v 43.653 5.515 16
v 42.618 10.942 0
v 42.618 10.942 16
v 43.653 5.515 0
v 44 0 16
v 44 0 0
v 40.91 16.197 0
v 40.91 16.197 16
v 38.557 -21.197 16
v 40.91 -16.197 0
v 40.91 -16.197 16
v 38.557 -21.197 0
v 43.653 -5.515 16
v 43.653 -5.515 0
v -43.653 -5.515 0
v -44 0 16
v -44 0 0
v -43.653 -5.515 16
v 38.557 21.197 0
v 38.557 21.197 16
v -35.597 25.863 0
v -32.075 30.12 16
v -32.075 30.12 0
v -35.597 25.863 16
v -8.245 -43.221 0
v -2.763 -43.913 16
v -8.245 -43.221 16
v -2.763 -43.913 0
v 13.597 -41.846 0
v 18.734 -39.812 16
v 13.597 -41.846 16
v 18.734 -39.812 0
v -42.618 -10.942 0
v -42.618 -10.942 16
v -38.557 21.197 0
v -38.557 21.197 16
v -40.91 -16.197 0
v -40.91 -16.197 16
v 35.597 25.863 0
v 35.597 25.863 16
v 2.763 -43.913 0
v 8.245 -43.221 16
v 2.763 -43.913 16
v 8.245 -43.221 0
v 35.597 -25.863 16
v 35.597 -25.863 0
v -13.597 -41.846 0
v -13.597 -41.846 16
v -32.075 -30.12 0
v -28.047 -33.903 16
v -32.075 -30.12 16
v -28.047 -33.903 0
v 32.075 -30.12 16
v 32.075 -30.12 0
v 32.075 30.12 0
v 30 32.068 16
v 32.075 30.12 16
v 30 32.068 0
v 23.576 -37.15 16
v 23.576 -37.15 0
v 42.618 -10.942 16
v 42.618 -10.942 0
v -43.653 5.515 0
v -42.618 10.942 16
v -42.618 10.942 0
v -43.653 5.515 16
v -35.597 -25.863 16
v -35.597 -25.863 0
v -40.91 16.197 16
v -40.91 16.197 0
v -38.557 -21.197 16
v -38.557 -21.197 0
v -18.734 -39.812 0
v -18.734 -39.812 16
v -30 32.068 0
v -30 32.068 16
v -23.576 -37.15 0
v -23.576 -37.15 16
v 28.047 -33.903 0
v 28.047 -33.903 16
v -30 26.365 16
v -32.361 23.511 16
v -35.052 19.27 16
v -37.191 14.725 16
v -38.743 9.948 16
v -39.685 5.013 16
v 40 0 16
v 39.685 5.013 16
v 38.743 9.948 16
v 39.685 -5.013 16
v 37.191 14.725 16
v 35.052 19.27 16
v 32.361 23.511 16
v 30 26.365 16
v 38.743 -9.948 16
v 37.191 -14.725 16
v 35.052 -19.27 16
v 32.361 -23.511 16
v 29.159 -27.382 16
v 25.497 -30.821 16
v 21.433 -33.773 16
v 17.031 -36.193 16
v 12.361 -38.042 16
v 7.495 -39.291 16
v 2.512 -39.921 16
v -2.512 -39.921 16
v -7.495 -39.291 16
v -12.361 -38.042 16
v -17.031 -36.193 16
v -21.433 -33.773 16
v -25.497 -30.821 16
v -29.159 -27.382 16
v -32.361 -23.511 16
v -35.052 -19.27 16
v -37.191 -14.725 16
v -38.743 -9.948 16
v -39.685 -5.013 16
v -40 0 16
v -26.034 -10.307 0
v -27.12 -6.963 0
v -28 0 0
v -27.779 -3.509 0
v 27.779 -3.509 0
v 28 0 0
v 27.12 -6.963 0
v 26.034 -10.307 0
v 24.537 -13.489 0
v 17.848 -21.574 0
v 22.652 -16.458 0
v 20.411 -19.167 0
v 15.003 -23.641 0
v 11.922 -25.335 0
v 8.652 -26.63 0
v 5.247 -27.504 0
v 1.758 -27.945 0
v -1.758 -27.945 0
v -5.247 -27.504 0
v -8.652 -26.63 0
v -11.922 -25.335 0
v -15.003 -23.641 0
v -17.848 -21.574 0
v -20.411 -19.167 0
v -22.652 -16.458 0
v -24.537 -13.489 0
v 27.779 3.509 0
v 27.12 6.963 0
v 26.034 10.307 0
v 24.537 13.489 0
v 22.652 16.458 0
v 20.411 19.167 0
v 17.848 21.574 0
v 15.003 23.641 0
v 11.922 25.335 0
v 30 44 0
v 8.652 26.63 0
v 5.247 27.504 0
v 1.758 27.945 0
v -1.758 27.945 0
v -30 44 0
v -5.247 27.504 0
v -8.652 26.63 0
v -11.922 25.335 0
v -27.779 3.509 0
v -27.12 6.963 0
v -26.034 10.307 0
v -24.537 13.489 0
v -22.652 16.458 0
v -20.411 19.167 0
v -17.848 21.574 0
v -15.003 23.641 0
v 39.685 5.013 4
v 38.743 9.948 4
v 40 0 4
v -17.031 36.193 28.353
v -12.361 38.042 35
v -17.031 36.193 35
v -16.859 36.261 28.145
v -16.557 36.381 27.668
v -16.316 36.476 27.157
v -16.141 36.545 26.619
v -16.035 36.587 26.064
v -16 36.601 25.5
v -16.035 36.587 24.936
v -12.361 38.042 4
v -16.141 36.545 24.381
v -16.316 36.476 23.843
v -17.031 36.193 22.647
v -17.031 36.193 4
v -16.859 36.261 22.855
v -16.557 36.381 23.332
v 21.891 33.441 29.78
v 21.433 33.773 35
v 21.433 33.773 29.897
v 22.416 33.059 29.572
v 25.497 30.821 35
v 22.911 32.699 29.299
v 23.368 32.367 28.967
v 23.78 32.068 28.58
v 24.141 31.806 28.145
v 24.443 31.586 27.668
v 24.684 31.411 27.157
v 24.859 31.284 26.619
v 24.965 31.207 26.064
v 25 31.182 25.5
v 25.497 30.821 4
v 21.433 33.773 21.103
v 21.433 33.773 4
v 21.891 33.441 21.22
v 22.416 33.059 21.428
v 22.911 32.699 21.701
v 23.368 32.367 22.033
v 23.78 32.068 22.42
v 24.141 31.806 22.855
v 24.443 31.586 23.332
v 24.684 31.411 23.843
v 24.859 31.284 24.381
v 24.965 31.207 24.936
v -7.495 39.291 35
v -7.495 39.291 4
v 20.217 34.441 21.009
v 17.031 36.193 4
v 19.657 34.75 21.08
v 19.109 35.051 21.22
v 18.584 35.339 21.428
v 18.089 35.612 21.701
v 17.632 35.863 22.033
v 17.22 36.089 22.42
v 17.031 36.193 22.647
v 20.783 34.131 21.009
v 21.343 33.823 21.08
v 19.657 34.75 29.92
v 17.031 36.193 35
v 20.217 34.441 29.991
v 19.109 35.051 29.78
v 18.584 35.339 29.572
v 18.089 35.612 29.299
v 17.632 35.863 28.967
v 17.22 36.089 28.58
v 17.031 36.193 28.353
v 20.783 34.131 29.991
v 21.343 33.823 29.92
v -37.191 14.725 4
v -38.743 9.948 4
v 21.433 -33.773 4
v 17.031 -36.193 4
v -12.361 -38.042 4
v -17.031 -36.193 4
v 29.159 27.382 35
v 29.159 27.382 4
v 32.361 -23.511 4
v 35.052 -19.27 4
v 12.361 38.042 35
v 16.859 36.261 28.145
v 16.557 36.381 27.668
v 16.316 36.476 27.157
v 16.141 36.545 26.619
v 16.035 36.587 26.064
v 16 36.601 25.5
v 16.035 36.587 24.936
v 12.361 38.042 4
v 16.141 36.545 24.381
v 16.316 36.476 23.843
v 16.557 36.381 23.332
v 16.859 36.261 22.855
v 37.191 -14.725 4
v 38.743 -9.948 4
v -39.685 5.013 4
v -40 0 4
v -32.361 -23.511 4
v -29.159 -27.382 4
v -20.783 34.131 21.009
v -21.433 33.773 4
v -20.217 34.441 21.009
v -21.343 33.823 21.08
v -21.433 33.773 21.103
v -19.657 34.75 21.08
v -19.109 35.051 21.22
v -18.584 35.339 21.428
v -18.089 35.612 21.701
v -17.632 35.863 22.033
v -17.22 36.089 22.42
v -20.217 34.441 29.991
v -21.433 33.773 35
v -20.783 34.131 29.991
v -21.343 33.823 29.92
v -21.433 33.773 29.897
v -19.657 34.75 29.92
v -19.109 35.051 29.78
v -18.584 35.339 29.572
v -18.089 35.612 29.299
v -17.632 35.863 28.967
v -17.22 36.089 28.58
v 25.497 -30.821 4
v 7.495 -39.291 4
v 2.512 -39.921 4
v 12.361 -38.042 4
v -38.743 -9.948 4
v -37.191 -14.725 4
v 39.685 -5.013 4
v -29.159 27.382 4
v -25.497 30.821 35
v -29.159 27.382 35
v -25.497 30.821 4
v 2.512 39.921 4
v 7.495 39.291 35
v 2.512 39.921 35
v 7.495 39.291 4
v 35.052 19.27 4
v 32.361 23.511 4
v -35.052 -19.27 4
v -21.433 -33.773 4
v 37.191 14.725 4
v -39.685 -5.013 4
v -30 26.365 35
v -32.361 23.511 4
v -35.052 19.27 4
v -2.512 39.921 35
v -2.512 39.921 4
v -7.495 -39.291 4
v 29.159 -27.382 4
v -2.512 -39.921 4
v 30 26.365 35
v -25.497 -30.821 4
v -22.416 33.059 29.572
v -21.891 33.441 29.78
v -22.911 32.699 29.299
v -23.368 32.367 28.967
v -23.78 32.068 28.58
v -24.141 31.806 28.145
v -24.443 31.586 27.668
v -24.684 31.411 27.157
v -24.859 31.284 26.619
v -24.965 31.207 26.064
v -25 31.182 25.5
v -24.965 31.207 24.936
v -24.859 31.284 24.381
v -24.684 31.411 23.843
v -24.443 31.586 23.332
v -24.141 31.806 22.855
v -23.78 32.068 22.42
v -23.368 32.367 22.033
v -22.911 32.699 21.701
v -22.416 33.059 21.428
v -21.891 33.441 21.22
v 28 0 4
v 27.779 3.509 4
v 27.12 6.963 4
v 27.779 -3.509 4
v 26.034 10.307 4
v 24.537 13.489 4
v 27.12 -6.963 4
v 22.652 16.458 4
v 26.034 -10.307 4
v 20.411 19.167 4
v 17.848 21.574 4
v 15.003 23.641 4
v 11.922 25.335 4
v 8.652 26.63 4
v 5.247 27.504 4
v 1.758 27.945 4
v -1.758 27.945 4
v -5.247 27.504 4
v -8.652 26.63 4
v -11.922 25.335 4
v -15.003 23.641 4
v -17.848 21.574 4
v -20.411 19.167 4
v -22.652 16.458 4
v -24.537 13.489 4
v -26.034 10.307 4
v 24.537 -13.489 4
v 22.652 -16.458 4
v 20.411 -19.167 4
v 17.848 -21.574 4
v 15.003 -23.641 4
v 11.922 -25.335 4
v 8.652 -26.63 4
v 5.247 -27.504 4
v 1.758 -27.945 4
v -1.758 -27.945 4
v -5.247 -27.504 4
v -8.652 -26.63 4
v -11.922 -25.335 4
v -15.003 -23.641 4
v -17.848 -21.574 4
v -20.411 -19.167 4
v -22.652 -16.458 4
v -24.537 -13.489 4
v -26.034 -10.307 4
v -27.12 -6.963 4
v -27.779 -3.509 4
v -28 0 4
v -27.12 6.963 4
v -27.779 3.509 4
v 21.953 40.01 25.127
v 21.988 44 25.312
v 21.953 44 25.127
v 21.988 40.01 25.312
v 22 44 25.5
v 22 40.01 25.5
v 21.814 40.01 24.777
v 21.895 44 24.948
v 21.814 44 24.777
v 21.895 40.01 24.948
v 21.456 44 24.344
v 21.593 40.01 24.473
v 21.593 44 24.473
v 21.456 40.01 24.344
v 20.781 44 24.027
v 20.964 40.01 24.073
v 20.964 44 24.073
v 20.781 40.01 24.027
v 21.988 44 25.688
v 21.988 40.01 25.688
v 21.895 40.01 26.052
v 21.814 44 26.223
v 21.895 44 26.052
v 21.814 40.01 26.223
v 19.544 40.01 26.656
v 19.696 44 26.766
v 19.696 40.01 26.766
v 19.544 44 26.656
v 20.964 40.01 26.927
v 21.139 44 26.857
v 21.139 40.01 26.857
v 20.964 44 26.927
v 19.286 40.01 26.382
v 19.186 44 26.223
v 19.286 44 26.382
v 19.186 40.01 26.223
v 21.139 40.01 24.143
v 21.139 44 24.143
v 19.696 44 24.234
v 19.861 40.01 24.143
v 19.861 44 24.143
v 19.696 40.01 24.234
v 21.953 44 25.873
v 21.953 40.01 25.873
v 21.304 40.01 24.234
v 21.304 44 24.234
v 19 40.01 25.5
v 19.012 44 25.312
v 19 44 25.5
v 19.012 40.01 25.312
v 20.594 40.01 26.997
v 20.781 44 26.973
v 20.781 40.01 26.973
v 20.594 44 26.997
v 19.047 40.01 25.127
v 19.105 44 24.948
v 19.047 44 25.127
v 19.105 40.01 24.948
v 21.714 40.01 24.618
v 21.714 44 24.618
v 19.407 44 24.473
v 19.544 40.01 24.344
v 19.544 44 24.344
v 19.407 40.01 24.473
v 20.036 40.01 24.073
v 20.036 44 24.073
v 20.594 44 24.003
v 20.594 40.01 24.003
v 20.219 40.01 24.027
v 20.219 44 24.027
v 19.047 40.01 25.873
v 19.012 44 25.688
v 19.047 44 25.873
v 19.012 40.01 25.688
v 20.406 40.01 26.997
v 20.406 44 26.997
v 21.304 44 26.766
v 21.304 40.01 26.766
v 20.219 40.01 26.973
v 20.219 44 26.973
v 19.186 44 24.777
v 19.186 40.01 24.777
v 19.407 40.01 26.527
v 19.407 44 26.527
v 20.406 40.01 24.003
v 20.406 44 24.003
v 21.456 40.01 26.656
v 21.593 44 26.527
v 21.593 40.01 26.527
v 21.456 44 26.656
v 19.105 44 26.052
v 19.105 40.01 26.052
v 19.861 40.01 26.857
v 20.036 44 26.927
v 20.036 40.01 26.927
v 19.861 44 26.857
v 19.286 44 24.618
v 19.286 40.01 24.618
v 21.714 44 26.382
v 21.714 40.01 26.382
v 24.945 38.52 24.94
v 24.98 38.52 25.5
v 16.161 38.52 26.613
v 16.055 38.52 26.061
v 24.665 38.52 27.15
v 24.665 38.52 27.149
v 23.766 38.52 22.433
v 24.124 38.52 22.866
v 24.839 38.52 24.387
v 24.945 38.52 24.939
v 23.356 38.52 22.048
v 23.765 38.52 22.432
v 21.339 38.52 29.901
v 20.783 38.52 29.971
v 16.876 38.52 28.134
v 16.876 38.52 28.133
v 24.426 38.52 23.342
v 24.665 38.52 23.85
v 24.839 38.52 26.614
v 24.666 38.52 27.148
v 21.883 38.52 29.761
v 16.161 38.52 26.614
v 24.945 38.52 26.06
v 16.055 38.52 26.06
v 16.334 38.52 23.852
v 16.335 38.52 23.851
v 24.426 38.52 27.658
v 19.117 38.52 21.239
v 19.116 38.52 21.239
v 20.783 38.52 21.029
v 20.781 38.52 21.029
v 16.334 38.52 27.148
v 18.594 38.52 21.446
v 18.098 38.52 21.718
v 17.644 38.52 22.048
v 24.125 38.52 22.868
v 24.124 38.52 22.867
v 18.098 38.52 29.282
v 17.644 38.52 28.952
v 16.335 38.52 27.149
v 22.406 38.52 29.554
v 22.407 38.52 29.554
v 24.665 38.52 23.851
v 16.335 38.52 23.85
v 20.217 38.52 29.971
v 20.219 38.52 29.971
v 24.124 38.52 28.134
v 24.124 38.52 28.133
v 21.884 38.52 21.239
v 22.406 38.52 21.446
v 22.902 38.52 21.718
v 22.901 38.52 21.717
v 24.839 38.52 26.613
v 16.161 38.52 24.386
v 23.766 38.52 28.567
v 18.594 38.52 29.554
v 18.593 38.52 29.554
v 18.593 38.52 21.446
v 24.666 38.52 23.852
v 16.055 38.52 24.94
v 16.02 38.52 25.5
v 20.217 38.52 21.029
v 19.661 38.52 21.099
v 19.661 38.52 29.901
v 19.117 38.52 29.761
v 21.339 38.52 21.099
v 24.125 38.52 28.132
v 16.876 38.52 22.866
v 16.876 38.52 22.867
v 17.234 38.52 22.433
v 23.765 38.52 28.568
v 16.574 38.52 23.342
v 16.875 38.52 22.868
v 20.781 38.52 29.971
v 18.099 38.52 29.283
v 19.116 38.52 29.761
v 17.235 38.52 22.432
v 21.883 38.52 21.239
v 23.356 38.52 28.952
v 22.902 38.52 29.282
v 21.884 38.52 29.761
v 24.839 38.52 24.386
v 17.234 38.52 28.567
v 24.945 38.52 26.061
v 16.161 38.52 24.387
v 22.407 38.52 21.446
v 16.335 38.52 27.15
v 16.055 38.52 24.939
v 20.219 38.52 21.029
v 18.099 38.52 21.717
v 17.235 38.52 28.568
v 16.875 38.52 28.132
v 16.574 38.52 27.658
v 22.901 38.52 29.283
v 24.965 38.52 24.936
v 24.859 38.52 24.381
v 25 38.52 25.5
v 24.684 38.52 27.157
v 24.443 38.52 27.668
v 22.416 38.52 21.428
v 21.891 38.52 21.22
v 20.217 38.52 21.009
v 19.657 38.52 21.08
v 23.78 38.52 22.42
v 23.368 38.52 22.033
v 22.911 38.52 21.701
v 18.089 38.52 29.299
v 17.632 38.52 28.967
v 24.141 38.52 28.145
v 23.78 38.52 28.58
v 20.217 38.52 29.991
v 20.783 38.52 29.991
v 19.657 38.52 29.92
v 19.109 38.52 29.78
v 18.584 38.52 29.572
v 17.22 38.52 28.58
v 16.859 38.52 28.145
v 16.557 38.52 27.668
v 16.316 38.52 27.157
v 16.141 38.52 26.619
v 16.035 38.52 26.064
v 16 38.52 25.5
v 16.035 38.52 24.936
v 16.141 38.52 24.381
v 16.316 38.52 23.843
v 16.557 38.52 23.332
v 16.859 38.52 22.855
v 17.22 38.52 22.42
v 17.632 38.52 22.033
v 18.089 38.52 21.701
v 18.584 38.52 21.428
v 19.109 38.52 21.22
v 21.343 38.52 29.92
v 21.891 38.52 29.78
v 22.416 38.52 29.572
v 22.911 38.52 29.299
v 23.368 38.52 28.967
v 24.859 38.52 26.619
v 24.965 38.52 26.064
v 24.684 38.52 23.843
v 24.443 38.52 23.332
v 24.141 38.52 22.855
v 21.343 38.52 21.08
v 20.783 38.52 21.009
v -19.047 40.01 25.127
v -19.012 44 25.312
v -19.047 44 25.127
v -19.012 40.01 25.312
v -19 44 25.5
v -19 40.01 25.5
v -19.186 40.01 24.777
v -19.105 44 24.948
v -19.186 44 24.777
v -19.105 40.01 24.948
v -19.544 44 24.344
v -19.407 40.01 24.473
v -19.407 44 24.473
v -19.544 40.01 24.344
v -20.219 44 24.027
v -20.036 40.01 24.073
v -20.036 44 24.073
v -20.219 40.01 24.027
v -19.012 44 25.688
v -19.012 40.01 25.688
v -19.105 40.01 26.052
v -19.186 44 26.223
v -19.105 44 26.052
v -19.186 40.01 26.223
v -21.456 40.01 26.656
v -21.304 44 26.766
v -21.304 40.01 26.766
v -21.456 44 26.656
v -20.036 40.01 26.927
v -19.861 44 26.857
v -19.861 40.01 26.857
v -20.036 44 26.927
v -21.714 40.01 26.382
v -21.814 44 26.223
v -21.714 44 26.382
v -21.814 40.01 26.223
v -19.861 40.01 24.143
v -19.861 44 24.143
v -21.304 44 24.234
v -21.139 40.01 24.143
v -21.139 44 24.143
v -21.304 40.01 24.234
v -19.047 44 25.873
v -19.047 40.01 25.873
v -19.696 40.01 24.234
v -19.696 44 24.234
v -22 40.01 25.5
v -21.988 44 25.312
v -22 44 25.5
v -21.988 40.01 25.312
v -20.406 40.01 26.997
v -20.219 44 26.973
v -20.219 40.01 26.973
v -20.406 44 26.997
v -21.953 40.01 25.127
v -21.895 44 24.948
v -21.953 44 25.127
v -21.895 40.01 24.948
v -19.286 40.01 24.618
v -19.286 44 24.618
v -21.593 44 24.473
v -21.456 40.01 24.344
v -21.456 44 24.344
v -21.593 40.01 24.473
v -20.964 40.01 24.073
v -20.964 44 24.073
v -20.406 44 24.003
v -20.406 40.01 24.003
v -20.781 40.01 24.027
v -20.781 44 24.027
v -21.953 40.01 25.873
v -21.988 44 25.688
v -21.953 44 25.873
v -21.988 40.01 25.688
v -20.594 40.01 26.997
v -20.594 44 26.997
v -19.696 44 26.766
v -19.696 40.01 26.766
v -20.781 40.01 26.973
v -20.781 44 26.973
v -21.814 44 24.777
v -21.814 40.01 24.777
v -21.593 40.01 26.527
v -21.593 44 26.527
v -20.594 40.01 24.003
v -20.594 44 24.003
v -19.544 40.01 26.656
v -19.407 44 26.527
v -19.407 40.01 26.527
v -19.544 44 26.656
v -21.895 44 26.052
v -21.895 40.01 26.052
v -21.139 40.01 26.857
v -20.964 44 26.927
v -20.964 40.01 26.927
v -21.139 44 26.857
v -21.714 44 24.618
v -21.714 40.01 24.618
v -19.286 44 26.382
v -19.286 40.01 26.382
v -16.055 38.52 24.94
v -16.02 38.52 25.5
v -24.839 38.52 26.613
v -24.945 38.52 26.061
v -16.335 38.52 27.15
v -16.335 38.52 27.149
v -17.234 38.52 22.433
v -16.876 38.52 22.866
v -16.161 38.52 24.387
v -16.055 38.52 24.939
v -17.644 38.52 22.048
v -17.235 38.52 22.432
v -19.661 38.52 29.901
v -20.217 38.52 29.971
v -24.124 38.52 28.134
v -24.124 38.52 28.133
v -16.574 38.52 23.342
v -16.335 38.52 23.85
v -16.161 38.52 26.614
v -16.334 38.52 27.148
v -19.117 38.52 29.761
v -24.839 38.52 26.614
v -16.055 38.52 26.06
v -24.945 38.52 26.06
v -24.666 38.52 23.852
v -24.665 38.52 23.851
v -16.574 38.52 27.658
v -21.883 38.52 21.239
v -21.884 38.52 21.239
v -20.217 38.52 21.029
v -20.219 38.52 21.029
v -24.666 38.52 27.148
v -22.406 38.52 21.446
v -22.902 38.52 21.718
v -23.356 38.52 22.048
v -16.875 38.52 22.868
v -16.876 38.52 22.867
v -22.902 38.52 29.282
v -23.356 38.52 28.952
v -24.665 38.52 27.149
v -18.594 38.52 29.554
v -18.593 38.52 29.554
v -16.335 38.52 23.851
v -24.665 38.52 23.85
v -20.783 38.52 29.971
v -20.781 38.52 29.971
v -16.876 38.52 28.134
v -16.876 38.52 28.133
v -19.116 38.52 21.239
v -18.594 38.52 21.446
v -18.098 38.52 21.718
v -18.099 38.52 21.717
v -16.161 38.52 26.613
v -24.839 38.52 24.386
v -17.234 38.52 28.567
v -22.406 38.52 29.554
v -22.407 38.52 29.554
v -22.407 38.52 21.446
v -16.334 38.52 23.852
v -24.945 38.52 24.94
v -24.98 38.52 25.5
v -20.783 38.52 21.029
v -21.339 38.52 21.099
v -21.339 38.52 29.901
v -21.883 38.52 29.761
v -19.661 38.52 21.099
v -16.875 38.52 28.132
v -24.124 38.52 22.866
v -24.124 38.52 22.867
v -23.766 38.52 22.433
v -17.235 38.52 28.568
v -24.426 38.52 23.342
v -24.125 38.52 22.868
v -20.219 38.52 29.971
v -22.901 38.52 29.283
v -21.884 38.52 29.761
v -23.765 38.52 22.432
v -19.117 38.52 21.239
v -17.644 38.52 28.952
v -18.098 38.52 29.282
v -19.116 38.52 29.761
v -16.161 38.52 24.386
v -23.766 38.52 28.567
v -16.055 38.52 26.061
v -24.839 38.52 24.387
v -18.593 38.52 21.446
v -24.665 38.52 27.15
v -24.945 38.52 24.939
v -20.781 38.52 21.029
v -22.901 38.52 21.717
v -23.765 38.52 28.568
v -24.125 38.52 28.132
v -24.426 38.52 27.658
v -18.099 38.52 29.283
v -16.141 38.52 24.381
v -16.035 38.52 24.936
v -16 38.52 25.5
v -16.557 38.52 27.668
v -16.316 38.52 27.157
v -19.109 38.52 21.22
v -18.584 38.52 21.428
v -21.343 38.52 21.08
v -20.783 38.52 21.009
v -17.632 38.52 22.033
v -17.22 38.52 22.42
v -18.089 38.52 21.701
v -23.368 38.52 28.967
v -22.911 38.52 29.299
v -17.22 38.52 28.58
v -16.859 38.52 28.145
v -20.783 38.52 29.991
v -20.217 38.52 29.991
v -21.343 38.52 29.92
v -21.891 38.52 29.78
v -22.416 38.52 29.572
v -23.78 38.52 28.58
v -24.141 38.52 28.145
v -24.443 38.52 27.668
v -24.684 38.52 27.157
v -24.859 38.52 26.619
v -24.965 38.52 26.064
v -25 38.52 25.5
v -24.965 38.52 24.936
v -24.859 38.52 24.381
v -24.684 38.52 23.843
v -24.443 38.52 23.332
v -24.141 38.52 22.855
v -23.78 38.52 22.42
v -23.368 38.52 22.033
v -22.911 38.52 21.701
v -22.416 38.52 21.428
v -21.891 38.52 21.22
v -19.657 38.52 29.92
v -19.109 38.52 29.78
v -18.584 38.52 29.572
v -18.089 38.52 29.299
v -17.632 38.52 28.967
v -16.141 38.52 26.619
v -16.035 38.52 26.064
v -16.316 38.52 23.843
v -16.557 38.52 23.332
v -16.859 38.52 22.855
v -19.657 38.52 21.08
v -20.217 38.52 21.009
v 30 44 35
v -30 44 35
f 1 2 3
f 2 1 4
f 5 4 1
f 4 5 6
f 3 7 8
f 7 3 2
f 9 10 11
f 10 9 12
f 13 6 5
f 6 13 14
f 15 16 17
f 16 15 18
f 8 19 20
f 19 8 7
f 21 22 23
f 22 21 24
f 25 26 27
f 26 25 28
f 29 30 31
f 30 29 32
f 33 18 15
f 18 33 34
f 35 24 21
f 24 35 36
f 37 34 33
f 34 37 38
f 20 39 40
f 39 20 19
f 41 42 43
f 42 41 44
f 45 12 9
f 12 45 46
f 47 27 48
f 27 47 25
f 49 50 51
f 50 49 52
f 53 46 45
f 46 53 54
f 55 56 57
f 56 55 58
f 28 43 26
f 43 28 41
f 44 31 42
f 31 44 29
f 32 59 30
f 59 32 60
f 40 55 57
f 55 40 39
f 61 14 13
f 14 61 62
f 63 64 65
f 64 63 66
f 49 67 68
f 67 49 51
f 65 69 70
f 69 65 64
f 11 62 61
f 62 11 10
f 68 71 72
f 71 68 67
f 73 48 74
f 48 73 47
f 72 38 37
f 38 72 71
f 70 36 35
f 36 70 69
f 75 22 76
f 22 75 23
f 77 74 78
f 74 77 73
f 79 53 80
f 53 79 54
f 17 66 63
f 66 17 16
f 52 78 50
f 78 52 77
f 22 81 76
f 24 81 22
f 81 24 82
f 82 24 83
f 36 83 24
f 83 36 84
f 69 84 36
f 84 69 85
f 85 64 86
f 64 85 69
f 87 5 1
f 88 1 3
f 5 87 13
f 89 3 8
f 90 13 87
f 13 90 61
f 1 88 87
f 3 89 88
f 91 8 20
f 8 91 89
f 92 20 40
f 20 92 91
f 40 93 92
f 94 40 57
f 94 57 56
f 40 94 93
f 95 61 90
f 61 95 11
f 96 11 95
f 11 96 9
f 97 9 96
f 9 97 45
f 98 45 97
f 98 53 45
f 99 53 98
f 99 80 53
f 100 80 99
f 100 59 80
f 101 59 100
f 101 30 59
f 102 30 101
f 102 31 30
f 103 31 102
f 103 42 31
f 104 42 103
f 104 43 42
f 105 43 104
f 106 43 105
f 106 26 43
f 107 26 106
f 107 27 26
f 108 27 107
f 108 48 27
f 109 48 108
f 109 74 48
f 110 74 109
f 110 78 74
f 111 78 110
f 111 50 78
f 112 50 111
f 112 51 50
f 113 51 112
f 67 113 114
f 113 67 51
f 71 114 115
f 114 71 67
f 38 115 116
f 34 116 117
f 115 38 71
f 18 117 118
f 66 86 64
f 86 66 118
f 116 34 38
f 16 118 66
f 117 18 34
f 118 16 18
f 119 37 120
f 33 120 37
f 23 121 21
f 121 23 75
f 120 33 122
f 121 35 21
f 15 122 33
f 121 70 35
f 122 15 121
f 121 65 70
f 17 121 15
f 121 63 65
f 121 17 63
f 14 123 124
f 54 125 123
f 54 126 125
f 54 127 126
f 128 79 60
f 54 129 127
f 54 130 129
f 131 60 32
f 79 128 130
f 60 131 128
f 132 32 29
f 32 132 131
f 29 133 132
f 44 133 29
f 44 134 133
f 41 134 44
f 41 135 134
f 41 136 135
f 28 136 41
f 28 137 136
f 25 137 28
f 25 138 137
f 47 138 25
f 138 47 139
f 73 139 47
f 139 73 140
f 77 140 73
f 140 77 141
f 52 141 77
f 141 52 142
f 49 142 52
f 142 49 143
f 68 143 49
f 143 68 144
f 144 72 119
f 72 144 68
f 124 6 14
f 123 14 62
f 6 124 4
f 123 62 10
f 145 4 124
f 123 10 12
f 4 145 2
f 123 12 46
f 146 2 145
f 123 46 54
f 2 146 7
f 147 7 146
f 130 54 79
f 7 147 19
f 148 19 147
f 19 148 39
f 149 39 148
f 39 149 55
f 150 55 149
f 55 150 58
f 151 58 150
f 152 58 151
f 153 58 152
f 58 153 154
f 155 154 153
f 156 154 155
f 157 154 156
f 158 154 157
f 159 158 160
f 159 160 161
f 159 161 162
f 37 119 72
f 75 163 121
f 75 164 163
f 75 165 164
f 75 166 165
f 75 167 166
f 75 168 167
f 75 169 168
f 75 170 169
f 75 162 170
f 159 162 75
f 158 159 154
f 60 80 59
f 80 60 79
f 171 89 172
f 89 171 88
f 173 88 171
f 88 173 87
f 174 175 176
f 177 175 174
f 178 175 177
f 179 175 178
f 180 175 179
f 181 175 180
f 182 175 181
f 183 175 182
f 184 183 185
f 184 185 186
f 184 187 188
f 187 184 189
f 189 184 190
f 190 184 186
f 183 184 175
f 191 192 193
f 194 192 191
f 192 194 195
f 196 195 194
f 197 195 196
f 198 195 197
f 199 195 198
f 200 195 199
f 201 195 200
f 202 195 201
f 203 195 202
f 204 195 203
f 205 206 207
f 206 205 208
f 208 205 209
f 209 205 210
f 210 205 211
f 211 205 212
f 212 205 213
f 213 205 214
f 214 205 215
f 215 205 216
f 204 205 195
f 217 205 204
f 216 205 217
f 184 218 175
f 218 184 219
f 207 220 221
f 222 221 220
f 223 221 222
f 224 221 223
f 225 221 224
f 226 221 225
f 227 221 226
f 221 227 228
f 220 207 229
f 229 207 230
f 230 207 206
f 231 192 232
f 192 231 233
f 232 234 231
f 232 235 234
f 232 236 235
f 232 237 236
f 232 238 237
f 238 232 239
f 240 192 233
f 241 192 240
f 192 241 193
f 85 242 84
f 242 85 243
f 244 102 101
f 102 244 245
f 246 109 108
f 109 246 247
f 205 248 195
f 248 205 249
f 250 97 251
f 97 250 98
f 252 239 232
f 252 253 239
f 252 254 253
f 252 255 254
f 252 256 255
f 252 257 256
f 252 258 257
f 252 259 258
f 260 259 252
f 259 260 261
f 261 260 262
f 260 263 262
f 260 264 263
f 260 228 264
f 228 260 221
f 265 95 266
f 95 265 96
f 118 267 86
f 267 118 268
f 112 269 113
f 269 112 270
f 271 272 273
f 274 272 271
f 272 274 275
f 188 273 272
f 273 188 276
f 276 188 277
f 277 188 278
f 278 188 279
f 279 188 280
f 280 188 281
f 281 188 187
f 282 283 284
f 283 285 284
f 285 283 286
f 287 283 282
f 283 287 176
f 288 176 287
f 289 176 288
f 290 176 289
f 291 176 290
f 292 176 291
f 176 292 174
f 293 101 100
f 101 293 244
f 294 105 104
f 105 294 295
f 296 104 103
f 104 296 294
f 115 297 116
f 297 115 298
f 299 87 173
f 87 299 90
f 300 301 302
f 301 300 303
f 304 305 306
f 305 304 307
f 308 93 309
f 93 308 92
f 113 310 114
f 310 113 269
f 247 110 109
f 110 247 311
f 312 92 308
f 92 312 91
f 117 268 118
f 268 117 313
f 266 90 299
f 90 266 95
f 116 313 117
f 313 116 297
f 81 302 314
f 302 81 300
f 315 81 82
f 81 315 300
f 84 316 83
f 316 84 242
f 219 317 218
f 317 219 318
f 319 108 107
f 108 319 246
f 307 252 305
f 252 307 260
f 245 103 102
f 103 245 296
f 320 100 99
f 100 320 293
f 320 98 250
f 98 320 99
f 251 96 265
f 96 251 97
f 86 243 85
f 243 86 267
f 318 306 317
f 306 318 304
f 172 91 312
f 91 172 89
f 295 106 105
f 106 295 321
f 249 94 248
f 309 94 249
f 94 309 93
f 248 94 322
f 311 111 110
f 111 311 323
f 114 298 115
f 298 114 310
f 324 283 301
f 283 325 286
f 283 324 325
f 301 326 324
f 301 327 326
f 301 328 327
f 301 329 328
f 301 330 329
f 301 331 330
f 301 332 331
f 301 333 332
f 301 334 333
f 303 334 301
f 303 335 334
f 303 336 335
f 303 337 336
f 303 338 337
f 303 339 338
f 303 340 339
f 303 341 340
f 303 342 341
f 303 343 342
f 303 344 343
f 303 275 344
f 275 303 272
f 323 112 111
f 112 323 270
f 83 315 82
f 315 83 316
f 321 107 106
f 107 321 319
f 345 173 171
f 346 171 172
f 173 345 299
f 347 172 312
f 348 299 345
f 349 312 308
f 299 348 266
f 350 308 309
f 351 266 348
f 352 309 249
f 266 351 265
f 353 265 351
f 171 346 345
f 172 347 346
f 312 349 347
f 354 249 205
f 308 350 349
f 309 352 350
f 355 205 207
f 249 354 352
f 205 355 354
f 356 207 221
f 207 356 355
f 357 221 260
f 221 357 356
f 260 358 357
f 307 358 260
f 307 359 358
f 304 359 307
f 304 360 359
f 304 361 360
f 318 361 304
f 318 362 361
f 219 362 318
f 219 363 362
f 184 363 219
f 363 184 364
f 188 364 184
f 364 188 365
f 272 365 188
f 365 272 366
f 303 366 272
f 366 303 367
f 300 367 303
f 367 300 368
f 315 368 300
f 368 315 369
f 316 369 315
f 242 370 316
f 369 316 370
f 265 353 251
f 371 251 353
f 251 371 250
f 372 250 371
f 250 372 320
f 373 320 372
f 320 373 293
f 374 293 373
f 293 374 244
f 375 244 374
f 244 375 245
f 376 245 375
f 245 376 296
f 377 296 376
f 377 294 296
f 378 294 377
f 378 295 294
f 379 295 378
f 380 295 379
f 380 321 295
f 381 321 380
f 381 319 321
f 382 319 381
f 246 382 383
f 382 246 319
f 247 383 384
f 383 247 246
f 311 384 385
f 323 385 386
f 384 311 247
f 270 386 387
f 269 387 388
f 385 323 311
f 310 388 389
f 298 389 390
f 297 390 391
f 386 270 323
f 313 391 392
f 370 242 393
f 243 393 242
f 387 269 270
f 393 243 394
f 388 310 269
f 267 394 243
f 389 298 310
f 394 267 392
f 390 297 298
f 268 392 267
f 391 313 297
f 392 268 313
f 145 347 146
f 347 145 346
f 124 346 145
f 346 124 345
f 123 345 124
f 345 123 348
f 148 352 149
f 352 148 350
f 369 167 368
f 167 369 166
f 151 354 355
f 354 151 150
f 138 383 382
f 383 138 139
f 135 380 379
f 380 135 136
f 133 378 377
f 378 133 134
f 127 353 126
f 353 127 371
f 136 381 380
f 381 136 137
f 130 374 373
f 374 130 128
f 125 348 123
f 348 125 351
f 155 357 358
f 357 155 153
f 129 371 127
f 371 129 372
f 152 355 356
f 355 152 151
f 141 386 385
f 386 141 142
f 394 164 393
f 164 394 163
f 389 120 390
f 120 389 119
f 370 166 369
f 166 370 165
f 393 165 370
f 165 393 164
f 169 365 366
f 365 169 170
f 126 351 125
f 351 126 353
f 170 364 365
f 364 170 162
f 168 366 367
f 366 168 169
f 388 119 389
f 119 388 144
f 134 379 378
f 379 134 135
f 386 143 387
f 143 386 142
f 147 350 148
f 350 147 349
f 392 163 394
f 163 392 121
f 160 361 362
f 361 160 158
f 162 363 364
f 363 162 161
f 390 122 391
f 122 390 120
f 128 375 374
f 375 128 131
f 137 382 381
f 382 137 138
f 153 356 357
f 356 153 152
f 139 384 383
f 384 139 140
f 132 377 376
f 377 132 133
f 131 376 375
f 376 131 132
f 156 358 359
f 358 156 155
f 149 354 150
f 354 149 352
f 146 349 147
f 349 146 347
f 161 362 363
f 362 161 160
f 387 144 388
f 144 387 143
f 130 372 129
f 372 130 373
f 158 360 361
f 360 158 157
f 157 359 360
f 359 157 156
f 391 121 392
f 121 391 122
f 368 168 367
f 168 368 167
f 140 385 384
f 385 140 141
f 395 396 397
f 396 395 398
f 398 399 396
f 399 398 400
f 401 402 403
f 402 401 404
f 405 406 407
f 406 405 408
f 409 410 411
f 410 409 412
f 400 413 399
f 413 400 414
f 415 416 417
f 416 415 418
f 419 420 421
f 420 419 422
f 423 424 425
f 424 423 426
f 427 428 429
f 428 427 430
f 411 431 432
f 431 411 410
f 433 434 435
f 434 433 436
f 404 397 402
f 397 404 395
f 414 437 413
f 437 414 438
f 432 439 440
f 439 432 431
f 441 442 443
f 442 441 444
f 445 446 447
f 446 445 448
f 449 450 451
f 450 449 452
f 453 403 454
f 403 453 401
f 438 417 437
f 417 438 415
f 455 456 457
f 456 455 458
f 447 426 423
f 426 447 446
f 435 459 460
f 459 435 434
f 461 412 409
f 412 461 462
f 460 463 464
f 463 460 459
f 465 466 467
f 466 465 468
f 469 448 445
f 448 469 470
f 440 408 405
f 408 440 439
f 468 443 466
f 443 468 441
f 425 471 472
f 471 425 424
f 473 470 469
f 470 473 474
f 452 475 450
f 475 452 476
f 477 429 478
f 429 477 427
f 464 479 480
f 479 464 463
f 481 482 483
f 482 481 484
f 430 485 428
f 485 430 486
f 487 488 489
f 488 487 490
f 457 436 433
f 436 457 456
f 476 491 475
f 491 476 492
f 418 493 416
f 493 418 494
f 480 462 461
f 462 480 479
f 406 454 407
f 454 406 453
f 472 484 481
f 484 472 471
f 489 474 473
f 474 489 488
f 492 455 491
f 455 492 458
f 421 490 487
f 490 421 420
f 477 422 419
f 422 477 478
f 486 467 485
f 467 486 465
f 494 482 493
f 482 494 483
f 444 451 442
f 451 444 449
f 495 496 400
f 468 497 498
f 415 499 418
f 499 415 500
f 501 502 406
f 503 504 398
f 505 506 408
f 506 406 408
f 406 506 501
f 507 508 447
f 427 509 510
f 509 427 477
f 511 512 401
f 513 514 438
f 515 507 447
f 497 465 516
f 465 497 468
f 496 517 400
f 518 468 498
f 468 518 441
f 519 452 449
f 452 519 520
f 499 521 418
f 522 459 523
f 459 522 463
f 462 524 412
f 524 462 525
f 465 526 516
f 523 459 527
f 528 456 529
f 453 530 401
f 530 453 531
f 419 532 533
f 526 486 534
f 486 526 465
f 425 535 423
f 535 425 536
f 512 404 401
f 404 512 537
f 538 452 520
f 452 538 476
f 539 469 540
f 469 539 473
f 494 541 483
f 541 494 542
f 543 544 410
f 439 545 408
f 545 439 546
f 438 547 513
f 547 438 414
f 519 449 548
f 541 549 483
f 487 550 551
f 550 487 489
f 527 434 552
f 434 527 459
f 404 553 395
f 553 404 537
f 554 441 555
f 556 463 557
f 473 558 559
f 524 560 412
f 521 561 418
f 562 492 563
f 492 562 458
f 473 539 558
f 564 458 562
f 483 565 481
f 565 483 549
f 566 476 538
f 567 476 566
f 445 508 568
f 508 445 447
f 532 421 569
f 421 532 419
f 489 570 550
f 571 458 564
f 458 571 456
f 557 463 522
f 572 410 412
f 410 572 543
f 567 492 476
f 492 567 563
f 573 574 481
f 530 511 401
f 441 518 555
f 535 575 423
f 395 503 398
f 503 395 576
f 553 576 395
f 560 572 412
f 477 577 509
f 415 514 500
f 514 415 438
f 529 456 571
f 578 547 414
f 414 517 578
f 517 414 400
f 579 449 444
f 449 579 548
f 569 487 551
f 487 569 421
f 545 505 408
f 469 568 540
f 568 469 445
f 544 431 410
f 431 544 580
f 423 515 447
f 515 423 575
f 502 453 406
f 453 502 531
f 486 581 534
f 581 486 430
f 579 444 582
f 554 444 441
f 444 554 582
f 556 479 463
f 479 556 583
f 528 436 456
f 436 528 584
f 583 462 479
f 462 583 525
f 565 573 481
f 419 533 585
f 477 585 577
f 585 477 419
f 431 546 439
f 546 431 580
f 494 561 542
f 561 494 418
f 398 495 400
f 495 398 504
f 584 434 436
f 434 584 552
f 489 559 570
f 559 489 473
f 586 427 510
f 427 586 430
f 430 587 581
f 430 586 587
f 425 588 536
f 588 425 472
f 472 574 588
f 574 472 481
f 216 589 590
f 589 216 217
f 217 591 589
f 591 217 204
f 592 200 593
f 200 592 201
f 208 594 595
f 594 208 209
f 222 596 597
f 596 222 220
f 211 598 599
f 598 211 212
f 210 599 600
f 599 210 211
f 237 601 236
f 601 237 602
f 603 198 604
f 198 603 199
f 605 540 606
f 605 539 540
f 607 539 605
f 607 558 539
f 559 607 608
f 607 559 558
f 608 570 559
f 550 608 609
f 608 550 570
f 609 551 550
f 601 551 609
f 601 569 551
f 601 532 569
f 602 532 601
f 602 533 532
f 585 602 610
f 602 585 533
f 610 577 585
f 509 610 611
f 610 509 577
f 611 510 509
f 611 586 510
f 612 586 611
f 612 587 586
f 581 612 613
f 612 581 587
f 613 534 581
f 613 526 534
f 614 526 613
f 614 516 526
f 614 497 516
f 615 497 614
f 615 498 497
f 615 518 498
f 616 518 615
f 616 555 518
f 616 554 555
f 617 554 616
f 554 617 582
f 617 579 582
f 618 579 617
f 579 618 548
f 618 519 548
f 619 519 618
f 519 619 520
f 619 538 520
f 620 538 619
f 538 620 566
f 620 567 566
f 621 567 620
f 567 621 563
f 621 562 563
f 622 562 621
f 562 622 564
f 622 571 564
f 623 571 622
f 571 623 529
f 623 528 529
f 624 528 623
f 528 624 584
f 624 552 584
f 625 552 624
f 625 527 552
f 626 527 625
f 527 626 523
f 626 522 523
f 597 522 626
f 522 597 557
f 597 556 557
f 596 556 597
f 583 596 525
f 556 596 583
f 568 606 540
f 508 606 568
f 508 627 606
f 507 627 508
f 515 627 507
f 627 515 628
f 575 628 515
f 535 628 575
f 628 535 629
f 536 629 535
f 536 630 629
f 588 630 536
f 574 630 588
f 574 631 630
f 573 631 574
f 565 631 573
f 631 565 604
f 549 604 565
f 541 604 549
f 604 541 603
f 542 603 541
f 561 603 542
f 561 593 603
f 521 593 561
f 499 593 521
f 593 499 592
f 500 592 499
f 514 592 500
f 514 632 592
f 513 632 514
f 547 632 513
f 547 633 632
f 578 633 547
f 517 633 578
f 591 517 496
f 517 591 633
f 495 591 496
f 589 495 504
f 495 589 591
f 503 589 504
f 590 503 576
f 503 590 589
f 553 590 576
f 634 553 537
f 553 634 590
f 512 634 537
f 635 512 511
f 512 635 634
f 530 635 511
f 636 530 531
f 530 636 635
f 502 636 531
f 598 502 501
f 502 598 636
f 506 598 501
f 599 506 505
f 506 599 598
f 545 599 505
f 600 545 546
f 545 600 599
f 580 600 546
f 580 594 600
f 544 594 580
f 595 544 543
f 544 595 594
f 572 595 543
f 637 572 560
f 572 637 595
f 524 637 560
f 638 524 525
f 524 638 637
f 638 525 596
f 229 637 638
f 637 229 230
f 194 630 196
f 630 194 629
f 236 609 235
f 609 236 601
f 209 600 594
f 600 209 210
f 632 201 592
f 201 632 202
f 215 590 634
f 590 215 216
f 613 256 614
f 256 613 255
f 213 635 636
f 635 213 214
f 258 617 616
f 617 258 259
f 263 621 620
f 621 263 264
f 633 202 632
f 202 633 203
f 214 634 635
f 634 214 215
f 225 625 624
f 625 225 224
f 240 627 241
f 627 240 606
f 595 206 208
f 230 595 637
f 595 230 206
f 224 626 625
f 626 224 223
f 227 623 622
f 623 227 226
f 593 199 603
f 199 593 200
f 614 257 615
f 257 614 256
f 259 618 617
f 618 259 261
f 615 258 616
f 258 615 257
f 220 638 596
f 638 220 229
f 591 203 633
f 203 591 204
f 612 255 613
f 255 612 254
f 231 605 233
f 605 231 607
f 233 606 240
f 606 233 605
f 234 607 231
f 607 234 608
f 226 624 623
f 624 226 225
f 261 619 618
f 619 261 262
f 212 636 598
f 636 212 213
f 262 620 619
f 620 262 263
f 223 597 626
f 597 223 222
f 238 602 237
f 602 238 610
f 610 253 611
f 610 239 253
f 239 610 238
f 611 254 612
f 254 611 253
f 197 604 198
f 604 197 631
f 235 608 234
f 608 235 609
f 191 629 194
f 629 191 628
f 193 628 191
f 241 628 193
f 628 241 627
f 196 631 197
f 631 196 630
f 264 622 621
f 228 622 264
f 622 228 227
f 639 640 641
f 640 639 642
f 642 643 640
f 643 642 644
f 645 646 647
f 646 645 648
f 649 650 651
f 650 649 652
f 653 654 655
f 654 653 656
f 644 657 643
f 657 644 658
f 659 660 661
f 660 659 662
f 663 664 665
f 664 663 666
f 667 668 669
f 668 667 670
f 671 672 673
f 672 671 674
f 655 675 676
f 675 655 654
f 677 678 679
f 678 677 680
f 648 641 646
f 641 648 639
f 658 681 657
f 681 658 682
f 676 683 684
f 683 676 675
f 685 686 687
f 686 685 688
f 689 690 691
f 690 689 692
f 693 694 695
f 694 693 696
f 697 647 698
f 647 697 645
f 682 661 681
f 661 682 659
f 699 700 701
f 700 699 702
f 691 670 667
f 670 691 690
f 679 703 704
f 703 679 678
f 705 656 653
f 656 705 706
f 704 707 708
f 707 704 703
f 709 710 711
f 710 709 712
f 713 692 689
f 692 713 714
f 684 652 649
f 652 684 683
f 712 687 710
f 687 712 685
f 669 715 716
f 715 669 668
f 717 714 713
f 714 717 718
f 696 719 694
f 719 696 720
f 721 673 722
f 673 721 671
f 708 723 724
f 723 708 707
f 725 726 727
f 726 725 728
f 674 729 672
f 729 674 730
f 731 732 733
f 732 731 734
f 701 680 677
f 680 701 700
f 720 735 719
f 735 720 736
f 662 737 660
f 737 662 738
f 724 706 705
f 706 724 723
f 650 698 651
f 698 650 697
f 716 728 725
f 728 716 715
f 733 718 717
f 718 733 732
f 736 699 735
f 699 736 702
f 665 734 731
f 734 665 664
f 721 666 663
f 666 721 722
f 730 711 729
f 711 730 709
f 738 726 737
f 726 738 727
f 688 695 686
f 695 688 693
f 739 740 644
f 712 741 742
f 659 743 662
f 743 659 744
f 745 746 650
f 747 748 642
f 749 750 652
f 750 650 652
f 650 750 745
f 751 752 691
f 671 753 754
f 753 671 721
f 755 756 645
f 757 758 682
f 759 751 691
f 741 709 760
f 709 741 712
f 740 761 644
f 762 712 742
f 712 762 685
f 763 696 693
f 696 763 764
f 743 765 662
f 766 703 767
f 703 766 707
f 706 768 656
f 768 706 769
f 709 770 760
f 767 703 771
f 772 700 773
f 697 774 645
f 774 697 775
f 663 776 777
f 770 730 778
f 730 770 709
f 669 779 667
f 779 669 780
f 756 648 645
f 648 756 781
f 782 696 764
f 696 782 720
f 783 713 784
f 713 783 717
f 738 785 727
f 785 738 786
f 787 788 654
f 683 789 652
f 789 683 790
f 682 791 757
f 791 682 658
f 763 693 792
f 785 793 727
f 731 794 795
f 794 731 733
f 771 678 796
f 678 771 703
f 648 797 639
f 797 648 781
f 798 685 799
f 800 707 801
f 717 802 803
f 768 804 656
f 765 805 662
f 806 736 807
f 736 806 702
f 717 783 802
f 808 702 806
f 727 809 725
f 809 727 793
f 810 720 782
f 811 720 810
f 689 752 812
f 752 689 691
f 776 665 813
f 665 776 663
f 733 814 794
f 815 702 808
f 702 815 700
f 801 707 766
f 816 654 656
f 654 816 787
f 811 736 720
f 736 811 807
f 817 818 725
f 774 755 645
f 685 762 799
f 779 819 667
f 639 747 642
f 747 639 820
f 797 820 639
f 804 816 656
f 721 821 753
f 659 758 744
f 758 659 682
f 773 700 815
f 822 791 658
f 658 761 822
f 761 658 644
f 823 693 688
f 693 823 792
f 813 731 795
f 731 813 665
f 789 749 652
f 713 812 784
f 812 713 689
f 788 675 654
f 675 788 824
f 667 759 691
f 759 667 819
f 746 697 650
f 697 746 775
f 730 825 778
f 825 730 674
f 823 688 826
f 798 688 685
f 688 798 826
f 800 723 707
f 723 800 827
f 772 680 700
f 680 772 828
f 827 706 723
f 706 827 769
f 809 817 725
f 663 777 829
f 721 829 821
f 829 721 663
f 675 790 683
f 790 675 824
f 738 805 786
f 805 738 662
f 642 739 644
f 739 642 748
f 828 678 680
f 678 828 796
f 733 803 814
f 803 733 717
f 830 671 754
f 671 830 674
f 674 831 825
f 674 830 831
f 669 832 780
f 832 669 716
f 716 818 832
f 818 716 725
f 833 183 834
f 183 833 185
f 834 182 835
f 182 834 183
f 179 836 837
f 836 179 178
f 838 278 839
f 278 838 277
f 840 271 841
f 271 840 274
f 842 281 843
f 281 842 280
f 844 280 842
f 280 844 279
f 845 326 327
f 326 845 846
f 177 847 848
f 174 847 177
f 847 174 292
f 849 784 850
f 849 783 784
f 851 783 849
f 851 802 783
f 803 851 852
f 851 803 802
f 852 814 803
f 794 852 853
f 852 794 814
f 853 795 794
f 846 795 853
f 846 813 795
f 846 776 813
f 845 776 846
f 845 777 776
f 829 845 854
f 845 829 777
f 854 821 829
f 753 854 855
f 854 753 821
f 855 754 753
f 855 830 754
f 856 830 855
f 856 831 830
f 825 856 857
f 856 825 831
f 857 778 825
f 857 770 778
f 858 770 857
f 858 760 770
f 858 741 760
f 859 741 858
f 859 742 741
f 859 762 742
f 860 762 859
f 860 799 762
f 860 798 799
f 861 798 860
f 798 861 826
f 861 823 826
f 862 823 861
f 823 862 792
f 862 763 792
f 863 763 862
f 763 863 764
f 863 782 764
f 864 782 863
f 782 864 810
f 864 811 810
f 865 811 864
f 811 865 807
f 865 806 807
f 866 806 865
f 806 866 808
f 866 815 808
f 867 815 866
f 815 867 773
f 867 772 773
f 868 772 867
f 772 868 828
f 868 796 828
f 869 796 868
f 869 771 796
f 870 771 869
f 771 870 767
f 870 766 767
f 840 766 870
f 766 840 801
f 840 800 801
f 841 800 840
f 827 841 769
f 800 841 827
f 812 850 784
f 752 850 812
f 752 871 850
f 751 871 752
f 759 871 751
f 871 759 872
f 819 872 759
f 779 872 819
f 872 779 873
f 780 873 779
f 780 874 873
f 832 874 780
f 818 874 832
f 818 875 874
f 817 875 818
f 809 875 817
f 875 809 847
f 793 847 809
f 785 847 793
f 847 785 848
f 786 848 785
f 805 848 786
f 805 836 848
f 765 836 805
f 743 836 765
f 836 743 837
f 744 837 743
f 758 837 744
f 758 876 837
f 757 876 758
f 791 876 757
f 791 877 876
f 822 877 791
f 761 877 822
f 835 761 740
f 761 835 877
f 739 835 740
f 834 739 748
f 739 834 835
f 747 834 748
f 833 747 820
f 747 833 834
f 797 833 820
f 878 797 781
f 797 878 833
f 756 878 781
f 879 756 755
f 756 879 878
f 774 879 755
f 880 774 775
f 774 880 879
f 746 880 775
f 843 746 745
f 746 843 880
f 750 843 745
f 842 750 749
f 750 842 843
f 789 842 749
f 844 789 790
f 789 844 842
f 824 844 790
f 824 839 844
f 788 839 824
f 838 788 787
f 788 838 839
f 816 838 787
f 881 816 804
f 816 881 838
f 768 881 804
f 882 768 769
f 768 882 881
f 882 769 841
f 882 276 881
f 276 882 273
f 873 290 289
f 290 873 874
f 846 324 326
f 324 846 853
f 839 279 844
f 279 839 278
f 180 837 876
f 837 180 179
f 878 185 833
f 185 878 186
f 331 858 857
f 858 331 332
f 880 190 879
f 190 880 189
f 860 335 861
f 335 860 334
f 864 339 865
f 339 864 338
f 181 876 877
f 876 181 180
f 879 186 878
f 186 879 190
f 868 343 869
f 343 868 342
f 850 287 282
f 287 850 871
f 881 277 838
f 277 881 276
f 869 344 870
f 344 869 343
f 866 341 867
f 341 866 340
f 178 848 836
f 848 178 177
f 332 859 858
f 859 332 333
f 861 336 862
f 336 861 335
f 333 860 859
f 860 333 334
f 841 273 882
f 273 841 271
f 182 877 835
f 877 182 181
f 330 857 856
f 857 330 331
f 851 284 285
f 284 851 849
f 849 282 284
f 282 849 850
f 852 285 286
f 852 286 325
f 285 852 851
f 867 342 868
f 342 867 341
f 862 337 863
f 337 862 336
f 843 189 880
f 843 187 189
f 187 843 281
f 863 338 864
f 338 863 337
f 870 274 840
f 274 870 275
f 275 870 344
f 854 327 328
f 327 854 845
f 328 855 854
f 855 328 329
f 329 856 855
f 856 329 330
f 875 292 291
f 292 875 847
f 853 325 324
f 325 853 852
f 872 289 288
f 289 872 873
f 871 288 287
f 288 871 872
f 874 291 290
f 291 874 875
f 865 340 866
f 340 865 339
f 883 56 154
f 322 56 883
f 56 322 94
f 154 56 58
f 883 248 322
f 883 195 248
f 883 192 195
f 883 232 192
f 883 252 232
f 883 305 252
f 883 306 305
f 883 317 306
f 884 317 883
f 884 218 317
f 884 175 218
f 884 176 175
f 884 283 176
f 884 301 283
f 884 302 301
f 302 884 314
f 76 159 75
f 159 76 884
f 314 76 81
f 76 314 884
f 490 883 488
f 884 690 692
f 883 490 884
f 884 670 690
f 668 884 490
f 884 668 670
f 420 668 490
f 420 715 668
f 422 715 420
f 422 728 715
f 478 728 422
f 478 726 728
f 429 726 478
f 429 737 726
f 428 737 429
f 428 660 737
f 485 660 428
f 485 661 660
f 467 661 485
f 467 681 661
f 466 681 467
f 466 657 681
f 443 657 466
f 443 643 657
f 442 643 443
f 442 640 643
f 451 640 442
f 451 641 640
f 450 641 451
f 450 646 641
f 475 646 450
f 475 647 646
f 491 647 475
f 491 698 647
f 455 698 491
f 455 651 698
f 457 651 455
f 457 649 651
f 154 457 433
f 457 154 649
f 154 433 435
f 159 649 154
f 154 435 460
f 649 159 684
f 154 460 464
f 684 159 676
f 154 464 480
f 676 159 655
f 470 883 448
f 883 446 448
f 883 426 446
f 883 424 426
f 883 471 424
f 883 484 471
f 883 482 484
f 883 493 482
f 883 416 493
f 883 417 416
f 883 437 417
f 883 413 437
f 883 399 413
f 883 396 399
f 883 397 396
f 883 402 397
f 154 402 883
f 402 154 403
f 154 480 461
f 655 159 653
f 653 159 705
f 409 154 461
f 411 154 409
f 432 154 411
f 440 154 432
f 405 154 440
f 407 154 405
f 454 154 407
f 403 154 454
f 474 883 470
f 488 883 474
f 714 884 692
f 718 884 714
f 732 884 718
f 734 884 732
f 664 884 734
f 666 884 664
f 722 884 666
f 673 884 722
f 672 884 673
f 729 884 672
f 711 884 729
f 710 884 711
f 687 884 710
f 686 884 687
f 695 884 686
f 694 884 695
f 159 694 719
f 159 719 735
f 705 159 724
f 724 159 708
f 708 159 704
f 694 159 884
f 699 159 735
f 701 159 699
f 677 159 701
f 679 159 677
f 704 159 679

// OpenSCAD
/* [ Basics ] */
// Which one would you like to see?
part = "Base"; // [Base:The bottom of the bracket,Arms:The arms to hold the extinguisher]

//The Diameter of your extinguisher (mm)
extinguisher_diameter = 80;
/* [ Extras ] */
// The width of the walls of the bracket (mm). Most parts scale with this value.
bracket_width = 4;
// The diameter of the screw hole (mm). The countersinking scales with this.
screw_hole_diameter = 3;
// The size of the gap in the arms (degrees).
arm_angle = 120; // [90:180]

/* [Hidden] */
// All done. Customizer doesn't need to see all this


$fn=50;
ext_r = extinguisher_diameter/2;
screw_r = screw_hole_diameter/2;
back_width = ext_r*1.5;
arm_angle = 120;

angle = (arm_angle - 90 )/2;
back_height = 8*bracket_width+screw_hole_diameter;

cube_size = 10; // [1:100]
cylinder_size = 10; // [1:100]

print_part();

module print_part() {
	if (part == "Base") {
		base();
		back_plate();
	} 
	else {
		back_plate();
		arms();
	}
}

module base(){
difference(){
cylinder(r = ext_r+bracket_width, h = 4*bracket_width);
translate([-0,0,bracket_width])cylinder(r = ext_r, h = 4*bracket_width);
translate([0,0,-bracket_width/2])cylinder(r = ext_r-3*bracket_width, h = 2*bracket_width);
}
}
//translate([0,ext_r-bracket_width,4*bracket_width])cube(back_height-4*bracket_width);

module arms(){
difference(){
cylinder(r = ext_r+bracket_width, h = 4*bracket_width);
translate([0,0,-bracket_width])cylinder(r = ext_r, h = 8*bracket_width);
rotate([0,0,angle])rotate([0,0,45+180])translate([0,0,-.01])cube(back_width);
rotate([0,0,-angle])rotate([0,0,45+180])translate([0,0,-.01])cube(back_width);
}
rotate([0,0,arm_angle/2])
translate([0,-(ext_r+bracket_width),0])cylinder(r = bracket_width, h = 4*bracket_width);
rotate([0,0,-arm_angle/2])
translate([0,-(ext_r+bracket_width),0])cylinder(r = bracket_width, h = 4*bracket_width);

}

module back_plate(){
difference(){
translate([-back_width/2,bracket_width,0])cube([back_width, ext_r,back_height]);
translate([0,0,-.01])cylinder(r = ext_r, h = back_width*2);
translate([back_width/2-2*bracket_width-screw_r,0,0])screw_hole();
translate([-(back_width/2-2*bracket_width-screw_r),0,0])screw_hole();
}
}


module screw_hole(){
translate([0,ext_r,6*bracket_width+screw_r])rotate([-90,0,0])
union(){
cylinder(r = screw_r, h = extinguisher_diameter);
translate([0,0,-screw_r+.01])cylinder(r2 = screw_r, r1 = screw_r*3, h = screw_r);
translate([0,0,-screw_r-ext_r+.02])cylinder(r = screw_r*3, h = ext_r);
}
}
